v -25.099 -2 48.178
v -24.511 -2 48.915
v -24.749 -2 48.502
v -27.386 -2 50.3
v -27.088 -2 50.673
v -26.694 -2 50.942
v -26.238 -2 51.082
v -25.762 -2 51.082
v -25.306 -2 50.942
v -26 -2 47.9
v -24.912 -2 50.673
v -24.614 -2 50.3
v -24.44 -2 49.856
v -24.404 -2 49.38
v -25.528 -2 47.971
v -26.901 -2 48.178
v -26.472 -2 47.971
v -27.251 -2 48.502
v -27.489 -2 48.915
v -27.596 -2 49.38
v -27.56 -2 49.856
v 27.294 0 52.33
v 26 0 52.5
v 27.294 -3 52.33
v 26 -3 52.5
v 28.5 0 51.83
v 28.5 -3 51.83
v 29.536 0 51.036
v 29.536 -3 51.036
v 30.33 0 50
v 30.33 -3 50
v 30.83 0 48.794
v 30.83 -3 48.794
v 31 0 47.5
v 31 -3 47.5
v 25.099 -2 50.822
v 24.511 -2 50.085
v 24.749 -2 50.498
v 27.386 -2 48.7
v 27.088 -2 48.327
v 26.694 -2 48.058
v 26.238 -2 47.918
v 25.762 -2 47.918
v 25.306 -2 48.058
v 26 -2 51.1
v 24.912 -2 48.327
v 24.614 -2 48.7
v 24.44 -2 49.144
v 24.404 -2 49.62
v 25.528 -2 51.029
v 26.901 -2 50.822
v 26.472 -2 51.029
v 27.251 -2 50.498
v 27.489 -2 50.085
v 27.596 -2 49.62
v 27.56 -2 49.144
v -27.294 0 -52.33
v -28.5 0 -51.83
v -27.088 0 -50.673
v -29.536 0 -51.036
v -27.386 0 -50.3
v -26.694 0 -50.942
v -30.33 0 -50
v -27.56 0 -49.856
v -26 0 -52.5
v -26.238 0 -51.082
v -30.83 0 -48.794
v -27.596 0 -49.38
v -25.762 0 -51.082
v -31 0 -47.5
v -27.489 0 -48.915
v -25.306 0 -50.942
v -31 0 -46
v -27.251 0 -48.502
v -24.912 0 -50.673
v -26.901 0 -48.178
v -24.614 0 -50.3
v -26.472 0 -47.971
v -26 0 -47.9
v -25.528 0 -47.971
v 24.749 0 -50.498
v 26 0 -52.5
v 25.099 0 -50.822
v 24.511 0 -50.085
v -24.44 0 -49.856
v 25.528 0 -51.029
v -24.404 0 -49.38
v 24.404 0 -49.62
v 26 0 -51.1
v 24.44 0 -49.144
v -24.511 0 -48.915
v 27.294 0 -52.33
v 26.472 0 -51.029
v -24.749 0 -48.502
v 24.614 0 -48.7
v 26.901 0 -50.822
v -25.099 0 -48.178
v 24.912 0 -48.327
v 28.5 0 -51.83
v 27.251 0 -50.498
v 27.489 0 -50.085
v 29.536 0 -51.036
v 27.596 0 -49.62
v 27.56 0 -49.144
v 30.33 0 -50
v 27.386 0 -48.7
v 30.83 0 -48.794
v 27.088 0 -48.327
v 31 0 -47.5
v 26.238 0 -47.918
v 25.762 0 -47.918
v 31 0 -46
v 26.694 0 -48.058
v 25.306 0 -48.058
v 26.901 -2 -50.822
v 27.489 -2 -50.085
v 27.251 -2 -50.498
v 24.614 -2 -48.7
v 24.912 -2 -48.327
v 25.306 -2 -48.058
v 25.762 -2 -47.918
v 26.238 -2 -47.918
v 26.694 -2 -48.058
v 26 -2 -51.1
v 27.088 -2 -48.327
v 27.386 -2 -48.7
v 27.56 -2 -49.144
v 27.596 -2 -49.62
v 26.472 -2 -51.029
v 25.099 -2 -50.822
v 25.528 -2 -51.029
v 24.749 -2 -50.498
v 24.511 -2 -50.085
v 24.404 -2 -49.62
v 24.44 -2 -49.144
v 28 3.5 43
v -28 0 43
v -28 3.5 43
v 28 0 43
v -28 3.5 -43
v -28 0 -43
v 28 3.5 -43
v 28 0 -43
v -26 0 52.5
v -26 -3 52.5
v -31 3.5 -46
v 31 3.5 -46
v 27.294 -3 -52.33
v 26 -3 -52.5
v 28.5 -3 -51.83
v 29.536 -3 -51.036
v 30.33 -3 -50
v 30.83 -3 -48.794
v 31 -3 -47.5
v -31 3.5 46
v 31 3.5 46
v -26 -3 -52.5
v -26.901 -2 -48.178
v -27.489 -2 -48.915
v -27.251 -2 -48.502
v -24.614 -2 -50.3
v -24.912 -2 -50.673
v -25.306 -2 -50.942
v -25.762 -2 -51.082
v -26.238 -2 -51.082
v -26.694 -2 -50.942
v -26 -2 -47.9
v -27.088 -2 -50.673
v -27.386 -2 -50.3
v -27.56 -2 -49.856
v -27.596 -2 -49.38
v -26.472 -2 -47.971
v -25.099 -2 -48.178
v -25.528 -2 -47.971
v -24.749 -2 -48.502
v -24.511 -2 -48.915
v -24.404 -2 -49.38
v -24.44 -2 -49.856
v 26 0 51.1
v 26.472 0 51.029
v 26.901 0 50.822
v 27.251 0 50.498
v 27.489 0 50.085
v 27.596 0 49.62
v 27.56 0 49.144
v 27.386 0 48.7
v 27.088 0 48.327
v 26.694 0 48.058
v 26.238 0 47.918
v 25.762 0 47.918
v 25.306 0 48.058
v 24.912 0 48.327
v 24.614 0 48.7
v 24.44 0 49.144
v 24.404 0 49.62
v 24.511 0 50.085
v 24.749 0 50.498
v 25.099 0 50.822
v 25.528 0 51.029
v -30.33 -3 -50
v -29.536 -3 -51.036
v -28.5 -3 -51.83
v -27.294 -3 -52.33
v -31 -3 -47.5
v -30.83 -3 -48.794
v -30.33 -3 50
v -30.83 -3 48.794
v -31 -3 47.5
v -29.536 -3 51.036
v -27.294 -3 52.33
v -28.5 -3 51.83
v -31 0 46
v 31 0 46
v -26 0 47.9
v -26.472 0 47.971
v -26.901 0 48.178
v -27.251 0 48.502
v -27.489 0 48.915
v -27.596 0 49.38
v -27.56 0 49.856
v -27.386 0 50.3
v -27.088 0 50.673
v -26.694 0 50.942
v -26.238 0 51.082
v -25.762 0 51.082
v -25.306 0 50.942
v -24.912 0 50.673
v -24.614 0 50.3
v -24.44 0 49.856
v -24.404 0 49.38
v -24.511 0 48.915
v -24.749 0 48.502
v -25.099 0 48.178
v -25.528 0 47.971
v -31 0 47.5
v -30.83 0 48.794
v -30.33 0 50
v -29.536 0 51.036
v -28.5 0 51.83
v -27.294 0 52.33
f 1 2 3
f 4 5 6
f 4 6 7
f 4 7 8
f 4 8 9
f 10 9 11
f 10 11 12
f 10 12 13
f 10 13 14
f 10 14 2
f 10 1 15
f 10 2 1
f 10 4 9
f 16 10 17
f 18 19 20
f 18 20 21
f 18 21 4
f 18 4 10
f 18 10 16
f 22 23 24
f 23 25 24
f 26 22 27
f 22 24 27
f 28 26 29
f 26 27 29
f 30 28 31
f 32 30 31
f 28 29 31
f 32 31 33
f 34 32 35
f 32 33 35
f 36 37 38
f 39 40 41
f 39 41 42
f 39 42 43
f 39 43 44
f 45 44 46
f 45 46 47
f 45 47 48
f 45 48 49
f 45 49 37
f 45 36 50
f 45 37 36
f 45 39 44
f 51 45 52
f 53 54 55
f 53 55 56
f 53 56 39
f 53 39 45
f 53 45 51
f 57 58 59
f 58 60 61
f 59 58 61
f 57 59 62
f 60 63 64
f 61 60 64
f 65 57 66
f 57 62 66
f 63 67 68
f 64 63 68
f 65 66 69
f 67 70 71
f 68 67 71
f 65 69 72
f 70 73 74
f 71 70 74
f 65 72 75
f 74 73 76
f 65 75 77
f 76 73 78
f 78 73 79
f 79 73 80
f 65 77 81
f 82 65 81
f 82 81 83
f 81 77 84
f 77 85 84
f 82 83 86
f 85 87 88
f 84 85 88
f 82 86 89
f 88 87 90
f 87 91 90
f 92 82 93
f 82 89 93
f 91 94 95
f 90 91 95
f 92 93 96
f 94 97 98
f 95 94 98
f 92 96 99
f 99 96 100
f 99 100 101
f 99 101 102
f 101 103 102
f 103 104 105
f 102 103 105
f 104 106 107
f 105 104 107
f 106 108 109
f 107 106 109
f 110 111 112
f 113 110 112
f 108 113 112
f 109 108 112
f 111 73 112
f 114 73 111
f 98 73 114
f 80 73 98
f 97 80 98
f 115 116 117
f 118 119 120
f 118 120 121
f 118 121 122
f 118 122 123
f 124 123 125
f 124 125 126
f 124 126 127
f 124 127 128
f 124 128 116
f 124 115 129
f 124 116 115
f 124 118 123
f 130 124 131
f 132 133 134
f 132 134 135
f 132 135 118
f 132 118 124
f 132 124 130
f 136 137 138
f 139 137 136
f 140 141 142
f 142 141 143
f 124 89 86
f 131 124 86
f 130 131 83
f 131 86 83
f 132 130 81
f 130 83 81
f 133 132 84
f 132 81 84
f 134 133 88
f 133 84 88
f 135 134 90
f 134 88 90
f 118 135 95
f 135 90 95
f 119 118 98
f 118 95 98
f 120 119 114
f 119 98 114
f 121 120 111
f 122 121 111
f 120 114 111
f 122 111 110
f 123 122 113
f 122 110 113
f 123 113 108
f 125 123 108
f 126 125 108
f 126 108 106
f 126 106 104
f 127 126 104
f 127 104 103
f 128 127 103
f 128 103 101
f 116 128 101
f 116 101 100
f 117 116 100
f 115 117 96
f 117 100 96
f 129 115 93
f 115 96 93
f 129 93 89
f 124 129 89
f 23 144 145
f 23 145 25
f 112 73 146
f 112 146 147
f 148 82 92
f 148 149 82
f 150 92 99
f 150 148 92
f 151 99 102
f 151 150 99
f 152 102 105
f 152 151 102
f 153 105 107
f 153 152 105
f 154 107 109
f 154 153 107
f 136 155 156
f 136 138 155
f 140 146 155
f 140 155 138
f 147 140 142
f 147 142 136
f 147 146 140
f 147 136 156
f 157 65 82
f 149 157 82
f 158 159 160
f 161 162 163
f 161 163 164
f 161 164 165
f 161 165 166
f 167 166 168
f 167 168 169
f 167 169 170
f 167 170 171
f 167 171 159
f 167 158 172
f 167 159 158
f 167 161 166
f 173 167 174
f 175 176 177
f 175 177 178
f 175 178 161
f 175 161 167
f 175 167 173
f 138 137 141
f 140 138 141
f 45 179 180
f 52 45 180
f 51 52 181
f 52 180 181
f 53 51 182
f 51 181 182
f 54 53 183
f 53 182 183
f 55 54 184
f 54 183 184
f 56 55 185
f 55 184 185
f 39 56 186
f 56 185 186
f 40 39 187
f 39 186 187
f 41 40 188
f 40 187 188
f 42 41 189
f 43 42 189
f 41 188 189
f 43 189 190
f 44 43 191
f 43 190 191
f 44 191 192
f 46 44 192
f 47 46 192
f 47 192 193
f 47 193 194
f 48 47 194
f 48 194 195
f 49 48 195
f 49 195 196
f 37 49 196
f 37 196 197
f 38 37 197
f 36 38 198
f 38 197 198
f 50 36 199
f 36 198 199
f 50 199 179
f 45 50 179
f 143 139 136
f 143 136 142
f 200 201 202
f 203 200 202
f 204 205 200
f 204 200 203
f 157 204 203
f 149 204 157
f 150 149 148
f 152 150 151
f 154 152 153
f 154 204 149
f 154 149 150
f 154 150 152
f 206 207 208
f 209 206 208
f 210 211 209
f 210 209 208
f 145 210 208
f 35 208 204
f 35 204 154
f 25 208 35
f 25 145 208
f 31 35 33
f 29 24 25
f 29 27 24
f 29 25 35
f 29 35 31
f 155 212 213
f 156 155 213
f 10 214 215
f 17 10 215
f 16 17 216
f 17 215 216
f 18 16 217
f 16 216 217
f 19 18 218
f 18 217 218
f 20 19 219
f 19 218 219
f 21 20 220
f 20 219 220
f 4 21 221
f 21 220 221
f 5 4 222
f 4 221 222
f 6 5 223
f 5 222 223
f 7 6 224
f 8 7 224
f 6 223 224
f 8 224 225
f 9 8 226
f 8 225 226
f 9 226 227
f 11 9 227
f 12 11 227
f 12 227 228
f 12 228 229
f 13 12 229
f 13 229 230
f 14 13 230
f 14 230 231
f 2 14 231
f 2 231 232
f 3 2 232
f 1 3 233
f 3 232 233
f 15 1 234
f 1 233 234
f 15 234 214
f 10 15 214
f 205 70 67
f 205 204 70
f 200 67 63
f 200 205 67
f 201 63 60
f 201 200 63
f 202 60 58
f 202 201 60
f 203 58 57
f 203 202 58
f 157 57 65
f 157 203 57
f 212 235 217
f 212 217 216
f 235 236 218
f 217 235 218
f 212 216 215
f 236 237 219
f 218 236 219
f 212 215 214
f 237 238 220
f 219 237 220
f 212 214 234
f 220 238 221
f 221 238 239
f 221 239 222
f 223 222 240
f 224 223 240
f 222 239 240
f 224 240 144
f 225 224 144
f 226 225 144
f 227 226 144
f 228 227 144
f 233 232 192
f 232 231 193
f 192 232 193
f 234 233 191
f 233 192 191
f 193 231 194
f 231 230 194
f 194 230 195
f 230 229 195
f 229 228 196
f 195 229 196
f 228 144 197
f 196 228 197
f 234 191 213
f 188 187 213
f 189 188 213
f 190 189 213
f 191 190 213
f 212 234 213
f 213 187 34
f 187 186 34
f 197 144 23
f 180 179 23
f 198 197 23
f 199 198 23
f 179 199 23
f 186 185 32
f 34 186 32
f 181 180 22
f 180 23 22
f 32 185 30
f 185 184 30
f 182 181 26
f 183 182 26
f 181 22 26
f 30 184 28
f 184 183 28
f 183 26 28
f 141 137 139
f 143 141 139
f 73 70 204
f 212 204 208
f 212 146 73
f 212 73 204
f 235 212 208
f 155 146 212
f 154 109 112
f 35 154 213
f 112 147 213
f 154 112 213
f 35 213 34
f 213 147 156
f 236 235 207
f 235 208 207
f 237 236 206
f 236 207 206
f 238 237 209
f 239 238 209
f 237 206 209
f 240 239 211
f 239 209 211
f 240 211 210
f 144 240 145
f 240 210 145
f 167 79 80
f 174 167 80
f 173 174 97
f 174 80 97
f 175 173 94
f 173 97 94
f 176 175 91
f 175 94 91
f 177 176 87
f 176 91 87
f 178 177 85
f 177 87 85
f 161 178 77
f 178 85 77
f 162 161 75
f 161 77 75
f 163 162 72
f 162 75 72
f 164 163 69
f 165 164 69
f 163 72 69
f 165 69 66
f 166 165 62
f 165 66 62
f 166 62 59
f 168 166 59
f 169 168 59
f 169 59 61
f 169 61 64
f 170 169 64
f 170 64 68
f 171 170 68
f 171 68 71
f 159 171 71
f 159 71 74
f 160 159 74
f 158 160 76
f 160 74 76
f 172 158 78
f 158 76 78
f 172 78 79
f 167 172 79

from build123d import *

# Parameters (mm, degrees)
SKETCH_1_W          = 62
SKETCH_1_H          = 92
SKETCH_1_W_2        = 56
SKETCH_1_H_2        = 86
EXTRUDE_1_DEPTH     = 3.5
SKETCH_2_W          = 62
SKETCH_2_H          = 105
EXTRUDE_2_DEPTH     = 3
FILLET_2_R          = 5
SKETCH_3_R          = 1.6
CUT_EXTRUDE_1_DEPTH = 2


with BuildPart() as part:
    # 草图1 → 凸台-拉伸1 (new body)
    with BuildSketch(Plane(origin=(0, 0, 0), x_dir=(1, 0, 0), z_dir=(0, 1, 0))):
        Rectangle(SKETCH_1_W, SKETCH_1_H)
        Rectangle(SKETCH_1_W_2, SKETCH_1_H_2, mode=Mode.SUBTRACT)
    extrude(amount=EXTRUDE_1_DEPTH)

    # 草图2 → 凸台-拉伸2 (add)
    with BuildSketch(Plane.XZ):
        Rectangle(SKETCH_2_W, SKETCH_2_H)
    extrude(amount=EXTRUDE_2_DEPTH)

    # 圆角2
    fillet_2_edges = [part.edges().sort_by_distance(p)[0] for p in [
        (31, -1.5, -52.5),
        (31, -1.5, 52.5),
        (-31, -1.5, 52.5),
        (-31, -1.5, -52.5),
    ]]
    fillet(fillet_2_edges, radius=FILLET_2_R)

    # 草图3 → 切除-拉伸1 (cut)
    with BuildSketch(Plane(origin=(0, 0, 0), x_dir=(1, 0, 0), z_dir=(0, 1, 0))):
        with Locations(Location((-26, 49.5, 0), (0, 0, 270))):
            Circle(SKETCH_3_R)
        with Locations(Location((26, 49.5, 0), (0, 0, 90))):
            Circle(SKETCH_3_R)
        with Locations(Location((26, -49.5, 0), (0, 0, 270))):
            Circle(SKETCH_3_R)
        with Locations(Location((-26, -49.5, 0), (0, 0, 90))):
            Circle(SKETCH_3_R)
    extrude(amount=-CUT_EXTRUDE_1_DEPTH, mode=Mode.SUBTRACT)


solid = part.part
